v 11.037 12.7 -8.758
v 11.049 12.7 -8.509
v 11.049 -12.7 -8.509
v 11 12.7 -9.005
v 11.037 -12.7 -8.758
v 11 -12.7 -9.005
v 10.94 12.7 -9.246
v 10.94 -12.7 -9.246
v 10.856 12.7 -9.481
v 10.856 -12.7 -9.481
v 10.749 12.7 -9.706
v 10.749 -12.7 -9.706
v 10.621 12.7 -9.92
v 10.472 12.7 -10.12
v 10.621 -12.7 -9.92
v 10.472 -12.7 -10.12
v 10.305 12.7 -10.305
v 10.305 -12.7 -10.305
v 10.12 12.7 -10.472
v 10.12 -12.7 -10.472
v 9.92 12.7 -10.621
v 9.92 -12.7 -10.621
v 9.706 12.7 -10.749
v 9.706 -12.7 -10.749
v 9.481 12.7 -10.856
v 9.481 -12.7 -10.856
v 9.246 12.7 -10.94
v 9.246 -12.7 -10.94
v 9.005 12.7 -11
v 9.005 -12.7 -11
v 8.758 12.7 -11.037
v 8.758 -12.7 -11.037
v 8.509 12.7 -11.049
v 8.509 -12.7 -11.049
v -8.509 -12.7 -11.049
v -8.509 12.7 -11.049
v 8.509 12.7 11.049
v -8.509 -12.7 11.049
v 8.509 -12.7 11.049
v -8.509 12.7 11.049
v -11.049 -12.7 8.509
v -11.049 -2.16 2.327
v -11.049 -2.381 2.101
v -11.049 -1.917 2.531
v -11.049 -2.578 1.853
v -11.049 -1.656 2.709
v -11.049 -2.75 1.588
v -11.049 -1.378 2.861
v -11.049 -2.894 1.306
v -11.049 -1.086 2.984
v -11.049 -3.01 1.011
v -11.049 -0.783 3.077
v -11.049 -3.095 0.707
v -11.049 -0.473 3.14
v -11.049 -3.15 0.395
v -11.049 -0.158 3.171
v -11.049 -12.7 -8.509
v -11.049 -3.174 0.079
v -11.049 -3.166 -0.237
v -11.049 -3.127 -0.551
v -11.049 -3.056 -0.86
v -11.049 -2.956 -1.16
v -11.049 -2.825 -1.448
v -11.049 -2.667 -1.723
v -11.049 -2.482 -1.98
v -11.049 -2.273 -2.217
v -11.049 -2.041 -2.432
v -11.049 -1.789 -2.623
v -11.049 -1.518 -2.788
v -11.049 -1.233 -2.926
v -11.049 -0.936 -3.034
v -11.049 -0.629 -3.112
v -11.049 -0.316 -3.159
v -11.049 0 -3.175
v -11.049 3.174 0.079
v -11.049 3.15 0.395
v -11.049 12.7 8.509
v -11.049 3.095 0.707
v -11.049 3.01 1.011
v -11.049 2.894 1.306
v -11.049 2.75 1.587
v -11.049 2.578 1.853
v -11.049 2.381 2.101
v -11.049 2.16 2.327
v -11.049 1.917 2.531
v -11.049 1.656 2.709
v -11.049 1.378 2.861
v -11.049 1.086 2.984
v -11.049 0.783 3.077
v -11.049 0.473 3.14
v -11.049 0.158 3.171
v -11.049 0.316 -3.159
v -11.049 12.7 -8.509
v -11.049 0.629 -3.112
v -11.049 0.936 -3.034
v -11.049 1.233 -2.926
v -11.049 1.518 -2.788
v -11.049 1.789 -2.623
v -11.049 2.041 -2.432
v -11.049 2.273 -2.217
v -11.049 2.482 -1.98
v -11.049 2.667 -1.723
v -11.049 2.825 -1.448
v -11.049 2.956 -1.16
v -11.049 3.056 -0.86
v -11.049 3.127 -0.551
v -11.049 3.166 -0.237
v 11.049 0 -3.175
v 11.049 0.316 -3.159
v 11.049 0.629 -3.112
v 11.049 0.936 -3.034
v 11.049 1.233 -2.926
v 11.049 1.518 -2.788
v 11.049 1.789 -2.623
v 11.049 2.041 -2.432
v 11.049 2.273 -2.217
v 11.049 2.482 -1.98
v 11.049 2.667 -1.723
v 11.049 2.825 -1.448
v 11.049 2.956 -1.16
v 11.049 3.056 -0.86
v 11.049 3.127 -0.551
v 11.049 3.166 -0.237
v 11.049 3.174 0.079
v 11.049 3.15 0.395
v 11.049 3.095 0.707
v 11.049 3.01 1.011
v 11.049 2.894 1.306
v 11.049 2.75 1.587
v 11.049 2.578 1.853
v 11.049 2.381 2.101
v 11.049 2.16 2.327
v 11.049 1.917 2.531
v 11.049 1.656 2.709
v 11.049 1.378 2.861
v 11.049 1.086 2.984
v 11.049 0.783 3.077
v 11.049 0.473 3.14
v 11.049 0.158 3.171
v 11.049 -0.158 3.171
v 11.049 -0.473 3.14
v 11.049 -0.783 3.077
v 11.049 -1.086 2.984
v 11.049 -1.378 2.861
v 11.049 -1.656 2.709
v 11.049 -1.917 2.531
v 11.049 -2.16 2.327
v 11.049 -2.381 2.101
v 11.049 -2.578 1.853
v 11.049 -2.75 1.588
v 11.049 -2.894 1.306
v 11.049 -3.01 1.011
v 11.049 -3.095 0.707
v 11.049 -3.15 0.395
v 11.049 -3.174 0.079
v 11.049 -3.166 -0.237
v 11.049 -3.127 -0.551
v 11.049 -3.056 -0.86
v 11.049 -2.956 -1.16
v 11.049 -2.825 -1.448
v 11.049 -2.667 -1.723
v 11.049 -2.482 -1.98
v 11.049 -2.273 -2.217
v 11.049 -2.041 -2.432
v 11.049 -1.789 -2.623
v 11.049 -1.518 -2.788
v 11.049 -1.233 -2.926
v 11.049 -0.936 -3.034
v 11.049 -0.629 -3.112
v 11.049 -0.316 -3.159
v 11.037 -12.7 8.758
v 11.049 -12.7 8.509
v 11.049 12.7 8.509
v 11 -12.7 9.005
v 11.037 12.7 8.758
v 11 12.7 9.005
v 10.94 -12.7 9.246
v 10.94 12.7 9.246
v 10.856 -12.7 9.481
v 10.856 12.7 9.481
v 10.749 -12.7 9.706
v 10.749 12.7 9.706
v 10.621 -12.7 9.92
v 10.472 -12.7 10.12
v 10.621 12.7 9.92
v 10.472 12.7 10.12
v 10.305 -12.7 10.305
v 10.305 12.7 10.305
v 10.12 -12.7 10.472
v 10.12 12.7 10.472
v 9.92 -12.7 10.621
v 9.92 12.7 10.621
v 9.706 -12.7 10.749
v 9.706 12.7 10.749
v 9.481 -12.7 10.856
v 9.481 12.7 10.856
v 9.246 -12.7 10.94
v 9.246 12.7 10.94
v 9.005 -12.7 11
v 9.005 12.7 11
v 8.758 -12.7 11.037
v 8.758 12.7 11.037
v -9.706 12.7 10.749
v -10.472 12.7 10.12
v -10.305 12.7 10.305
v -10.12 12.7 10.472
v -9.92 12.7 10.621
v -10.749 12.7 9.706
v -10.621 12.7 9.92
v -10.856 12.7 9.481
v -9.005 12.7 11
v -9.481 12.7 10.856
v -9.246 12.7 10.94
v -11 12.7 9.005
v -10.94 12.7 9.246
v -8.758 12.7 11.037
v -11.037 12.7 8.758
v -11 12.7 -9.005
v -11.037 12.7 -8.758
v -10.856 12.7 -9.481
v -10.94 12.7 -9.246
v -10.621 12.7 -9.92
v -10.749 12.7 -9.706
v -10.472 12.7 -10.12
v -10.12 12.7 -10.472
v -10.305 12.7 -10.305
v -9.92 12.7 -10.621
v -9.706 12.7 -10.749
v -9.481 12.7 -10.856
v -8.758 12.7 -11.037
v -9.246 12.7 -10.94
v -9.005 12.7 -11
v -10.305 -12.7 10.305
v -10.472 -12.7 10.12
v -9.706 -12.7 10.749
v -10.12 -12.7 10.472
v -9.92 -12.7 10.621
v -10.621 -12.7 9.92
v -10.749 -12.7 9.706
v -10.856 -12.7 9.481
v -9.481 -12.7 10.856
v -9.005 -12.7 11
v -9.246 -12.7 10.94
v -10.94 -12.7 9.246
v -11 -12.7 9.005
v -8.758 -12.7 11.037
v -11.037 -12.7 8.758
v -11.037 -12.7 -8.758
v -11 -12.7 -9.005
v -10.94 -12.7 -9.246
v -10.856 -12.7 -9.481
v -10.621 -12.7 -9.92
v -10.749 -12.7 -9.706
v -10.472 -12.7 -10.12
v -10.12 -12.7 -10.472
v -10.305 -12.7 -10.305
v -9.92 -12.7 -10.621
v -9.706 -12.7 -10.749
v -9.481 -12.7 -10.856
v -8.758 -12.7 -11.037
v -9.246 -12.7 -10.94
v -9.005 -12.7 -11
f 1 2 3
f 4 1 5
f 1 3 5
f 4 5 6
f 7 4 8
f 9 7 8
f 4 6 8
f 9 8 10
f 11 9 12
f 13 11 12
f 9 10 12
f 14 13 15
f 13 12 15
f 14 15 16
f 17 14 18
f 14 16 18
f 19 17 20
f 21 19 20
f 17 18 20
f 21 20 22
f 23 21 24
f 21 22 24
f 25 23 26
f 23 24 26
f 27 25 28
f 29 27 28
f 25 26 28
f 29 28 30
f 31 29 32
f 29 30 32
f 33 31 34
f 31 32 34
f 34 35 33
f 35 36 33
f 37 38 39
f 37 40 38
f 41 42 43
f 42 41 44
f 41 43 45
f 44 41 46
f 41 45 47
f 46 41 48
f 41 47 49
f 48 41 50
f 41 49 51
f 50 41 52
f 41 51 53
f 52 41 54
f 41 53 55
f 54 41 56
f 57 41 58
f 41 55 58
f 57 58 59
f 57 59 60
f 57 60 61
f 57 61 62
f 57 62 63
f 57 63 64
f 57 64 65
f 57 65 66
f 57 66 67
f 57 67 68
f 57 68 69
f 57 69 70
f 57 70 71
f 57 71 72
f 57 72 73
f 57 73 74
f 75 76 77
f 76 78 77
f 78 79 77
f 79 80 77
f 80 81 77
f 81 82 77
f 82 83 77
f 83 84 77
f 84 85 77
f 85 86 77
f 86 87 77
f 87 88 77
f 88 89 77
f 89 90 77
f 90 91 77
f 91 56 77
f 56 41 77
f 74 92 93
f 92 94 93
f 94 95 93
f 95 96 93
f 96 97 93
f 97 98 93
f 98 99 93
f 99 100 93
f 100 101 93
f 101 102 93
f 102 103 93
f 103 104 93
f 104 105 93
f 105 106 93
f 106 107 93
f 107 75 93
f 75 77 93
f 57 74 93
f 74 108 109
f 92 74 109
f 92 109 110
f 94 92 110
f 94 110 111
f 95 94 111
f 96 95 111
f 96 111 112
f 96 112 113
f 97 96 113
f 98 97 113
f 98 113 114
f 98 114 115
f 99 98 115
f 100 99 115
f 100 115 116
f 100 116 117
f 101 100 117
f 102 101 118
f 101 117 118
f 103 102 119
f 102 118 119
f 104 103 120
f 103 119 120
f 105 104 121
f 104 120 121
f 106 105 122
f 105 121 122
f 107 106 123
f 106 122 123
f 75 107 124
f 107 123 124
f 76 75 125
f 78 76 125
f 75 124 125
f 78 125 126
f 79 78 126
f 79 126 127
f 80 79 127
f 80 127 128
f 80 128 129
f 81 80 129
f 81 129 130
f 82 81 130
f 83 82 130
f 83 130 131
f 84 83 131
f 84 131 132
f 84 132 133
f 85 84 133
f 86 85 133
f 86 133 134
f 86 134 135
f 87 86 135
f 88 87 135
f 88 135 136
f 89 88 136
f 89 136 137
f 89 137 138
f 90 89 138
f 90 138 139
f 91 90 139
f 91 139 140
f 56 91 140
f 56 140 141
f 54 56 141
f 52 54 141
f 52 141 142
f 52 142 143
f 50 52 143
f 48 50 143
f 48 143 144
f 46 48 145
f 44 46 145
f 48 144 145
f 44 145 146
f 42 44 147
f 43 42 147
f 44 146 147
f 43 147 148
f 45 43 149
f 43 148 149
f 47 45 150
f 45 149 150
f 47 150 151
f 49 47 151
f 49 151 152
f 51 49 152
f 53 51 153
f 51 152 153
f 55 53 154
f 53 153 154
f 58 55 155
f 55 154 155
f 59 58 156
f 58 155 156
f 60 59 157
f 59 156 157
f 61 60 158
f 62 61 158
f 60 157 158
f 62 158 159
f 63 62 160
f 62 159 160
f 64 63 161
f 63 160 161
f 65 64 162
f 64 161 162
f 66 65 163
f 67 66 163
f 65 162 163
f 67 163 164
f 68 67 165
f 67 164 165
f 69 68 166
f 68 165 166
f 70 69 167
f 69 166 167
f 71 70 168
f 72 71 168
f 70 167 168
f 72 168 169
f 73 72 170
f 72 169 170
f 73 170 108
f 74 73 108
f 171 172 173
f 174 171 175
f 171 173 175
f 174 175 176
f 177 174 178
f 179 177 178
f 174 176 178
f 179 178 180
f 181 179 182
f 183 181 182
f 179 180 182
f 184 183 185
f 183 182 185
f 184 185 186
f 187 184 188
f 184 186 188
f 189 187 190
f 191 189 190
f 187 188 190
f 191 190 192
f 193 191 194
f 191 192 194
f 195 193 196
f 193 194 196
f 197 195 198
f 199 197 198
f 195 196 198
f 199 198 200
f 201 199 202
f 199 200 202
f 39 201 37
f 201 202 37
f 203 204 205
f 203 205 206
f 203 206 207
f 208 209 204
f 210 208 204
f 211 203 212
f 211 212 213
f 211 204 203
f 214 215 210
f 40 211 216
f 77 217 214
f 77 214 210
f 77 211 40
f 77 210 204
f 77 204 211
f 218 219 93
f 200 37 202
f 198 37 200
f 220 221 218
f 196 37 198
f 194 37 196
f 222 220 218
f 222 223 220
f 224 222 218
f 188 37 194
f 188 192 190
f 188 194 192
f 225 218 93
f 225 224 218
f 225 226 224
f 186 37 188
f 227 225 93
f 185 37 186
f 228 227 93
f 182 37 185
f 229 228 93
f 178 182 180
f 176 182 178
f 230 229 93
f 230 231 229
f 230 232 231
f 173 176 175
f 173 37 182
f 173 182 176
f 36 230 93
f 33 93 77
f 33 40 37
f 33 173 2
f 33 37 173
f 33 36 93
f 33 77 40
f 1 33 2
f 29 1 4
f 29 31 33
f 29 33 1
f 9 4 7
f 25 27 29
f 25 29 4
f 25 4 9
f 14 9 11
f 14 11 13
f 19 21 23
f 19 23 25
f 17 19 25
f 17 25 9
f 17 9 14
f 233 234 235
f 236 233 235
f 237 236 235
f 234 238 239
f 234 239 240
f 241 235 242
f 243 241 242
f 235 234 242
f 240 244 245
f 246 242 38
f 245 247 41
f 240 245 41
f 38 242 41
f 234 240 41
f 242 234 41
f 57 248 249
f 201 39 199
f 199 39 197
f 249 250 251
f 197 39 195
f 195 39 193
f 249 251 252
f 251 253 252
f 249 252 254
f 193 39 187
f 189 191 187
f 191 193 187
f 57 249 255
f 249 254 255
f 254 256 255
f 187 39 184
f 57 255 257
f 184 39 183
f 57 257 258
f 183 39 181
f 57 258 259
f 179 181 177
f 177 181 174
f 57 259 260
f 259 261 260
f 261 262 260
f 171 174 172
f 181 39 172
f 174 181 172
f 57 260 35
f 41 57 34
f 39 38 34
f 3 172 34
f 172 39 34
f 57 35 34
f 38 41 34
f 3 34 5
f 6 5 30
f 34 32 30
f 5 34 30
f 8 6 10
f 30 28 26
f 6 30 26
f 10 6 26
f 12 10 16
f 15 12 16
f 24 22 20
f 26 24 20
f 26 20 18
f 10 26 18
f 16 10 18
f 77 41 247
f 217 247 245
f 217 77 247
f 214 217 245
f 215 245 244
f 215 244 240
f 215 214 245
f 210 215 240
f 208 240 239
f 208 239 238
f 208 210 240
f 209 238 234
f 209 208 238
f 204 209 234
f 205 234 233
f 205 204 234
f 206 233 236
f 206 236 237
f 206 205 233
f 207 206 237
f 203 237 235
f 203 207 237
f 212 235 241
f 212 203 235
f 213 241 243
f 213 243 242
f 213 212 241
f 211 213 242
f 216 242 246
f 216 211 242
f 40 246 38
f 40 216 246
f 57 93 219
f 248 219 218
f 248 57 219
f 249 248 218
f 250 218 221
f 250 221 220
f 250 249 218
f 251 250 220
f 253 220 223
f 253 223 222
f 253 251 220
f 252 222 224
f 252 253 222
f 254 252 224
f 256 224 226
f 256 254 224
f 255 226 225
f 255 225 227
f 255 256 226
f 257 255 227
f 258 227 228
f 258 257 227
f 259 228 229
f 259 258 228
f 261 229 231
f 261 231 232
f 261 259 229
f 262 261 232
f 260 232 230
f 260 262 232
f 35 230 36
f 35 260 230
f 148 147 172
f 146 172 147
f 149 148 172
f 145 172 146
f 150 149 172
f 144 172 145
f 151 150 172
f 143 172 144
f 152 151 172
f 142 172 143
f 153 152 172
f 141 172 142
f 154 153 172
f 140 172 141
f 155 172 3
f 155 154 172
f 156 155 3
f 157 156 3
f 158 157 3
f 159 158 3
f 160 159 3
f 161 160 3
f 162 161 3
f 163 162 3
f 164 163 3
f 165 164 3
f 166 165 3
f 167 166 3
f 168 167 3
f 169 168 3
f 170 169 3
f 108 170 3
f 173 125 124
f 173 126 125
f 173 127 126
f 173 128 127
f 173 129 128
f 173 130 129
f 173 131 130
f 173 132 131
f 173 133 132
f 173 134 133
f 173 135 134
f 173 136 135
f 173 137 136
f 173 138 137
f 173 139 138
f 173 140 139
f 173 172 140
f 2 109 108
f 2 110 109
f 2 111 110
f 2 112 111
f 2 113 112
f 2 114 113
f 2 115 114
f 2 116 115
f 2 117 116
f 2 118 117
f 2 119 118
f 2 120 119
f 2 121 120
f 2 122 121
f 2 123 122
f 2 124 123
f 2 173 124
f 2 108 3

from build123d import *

# Parameters (mm, degrees)
SKETCH4_W           = 22.098
SKETCH4_H           = 22.098
BOSS_EXTRUDE2_DEPTH = 12.7
FILLET1_R           = 2.54
SKETCH6_R           = 3.175
CUT_EXTRUDE1_DEPTH  = 28.779344935


with BuildPart() as part:
    # Sketch4 → Boss-Extrude2 (new, symmetric)
    with BuildSketch(Plane(origin=(0, 0, 0), x_dir=(1, 0, 0), z_dir=(0, 1, 0))):
        Rectangle(SKETCH4_W, SKETCH4_H)
    extrude(amount=BOSS_EXTRUDE2_DEPTH, both=True)

    # Fillet1
    fillet1_edges = [part.edges().sort_by_distance(p)[0] for p in [
        (11.049, 0, 11.049),
        (-11.049, 0, 11.049),
        (-11.049, 0, -11.049),
        (11.049, 0, -11.049),
    ]]
    fillet(fillet1_edges, radius=FILLET1_R)

    # Sketch6 → Cut-Extrude1 (cut, through all)
    with BuildSketch(Plane(origin=(11.049, 0, 0), x_dir=(0, 0, -1), z_dir=(1, 0, 0))):
        Circle(SKETCH6_R)
    extrude(amount=-CUT_EXTRUDE1_DEPTH, mode=Mode.SUBTRACT)


solid = part.part
